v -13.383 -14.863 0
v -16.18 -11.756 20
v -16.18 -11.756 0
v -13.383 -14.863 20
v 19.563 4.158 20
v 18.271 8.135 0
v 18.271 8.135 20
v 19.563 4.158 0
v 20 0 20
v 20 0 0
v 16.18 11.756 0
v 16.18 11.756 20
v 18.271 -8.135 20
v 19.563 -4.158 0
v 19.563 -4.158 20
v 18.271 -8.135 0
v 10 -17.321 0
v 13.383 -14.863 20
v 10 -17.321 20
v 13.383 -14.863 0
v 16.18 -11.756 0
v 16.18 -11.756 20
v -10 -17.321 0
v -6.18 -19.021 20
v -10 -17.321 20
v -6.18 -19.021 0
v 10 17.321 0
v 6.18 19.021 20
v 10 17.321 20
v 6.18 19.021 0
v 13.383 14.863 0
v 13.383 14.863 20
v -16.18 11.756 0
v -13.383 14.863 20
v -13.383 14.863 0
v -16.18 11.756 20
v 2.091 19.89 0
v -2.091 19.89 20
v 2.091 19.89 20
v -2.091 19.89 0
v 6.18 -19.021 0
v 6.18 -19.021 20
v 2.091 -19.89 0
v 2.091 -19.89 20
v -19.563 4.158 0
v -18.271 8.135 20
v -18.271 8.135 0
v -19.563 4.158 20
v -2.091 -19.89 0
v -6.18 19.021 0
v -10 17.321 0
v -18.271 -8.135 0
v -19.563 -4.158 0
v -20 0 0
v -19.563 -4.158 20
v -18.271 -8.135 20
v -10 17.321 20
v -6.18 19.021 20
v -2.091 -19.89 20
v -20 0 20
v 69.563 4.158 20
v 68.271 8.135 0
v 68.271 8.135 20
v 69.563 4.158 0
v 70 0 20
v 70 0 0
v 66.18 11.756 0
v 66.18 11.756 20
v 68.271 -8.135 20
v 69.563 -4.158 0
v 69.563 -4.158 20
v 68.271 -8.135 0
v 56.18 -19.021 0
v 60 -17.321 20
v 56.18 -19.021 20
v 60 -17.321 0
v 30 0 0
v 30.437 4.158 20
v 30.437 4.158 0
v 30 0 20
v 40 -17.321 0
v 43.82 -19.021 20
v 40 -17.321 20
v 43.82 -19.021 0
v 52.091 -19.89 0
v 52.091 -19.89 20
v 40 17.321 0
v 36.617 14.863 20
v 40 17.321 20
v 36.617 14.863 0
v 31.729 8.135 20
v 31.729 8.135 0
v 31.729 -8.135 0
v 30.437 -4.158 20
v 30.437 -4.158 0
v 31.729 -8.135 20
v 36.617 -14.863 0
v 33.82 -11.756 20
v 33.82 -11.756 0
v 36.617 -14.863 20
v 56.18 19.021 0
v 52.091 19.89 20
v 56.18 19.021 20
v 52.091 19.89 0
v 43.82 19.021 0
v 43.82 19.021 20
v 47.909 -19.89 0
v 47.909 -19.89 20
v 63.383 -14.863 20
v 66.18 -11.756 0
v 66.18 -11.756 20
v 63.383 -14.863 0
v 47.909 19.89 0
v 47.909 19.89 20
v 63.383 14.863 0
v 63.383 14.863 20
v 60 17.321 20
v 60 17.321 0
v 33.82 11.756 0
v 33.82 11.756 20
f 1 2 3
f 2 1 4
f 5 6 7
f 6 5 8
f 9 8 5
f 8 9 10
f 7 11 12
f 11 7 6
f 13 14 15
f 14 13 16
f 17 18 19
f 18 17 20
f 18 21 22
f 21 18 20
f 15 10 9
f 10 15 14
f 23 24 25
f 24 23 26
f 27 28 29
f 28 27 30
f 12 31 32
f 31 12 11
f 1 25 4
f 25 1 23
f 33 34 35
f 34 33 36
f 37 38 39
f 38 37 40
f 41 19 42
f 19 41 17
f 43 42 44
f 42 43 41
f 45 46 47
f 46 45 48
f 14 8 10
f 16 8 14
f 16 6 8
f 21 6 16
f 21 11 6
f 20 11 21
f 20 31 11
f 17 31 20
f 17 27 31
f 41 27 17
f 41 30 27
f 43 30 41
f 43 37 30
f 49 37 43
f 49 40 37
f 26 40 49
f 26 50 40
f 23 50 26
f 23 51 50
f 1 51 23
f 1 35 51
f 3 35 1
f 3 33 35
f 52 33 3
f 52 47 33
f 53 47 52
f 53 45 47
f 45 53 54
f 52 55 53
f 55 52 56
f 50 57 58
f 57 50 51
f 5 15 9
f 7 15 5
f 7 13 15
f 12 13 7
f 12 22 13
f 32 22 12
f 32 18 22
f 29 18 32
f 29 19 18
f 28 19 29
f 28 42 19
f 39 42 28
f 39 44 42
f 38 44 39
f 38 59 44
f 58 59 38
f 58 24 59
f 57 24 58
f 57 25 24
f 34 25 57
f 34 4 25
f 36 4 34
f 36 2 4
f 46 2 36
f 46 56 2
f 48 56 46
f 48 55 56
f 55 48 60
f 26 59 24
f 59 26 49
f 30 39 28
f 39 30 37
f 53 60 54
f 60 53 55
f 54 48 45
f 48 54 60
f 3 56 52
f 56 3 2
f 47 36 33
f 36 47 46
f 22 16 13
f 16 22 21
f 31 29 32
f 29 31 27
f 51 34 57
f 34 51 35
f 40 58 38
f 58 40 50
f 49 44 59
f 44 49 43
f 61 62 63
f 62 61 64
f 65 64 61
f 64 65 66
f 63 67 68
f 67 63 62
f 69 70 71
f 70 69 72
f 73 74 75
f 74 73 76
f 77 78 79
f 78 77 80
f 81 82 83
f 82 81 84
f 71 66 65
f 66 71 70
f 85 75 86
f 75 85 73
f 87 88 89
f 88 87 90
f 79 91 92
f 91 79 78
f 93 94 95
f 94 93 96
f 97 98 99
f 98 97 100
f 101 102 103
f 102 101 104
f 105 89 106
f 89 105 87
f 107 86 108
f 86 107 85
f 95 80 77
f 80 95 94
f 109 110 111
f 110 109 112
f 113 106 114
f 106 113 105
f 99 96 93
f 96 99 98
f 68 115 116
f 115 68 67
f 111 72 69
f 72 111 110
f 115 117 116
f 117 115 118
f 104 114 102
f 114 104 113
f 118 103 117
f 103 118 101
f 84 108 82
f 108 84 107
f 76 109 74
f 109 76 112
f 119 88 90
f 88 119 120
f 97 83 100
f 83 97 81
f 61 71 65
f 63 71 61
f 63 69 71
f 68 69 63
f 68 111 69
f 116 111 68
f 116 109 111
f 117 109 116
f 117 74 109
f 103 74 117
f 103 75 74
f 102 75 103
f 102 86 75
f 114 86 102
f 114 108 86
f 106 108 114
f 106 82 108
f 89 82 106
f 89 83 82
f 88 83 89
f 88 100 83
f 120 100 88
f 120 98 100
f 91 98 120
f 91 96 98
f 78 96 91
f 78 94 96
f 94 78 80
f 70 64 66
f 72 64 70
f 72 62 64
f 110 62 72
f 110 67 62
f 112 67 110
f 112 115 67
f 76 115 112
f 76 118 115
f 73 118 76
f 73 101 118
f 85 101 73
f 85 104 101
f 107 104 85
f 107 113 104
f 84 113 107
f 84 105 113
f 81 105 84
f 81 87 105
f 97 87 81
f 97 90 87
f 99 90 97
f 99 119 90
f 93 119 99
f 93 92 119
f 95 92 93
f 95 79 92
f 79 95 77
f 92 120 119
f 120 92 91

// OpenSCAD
x=10;

cylinder(h=20,r=x);

x=20;


translate([50,0,0])
cylinder(h=20,r=x);
